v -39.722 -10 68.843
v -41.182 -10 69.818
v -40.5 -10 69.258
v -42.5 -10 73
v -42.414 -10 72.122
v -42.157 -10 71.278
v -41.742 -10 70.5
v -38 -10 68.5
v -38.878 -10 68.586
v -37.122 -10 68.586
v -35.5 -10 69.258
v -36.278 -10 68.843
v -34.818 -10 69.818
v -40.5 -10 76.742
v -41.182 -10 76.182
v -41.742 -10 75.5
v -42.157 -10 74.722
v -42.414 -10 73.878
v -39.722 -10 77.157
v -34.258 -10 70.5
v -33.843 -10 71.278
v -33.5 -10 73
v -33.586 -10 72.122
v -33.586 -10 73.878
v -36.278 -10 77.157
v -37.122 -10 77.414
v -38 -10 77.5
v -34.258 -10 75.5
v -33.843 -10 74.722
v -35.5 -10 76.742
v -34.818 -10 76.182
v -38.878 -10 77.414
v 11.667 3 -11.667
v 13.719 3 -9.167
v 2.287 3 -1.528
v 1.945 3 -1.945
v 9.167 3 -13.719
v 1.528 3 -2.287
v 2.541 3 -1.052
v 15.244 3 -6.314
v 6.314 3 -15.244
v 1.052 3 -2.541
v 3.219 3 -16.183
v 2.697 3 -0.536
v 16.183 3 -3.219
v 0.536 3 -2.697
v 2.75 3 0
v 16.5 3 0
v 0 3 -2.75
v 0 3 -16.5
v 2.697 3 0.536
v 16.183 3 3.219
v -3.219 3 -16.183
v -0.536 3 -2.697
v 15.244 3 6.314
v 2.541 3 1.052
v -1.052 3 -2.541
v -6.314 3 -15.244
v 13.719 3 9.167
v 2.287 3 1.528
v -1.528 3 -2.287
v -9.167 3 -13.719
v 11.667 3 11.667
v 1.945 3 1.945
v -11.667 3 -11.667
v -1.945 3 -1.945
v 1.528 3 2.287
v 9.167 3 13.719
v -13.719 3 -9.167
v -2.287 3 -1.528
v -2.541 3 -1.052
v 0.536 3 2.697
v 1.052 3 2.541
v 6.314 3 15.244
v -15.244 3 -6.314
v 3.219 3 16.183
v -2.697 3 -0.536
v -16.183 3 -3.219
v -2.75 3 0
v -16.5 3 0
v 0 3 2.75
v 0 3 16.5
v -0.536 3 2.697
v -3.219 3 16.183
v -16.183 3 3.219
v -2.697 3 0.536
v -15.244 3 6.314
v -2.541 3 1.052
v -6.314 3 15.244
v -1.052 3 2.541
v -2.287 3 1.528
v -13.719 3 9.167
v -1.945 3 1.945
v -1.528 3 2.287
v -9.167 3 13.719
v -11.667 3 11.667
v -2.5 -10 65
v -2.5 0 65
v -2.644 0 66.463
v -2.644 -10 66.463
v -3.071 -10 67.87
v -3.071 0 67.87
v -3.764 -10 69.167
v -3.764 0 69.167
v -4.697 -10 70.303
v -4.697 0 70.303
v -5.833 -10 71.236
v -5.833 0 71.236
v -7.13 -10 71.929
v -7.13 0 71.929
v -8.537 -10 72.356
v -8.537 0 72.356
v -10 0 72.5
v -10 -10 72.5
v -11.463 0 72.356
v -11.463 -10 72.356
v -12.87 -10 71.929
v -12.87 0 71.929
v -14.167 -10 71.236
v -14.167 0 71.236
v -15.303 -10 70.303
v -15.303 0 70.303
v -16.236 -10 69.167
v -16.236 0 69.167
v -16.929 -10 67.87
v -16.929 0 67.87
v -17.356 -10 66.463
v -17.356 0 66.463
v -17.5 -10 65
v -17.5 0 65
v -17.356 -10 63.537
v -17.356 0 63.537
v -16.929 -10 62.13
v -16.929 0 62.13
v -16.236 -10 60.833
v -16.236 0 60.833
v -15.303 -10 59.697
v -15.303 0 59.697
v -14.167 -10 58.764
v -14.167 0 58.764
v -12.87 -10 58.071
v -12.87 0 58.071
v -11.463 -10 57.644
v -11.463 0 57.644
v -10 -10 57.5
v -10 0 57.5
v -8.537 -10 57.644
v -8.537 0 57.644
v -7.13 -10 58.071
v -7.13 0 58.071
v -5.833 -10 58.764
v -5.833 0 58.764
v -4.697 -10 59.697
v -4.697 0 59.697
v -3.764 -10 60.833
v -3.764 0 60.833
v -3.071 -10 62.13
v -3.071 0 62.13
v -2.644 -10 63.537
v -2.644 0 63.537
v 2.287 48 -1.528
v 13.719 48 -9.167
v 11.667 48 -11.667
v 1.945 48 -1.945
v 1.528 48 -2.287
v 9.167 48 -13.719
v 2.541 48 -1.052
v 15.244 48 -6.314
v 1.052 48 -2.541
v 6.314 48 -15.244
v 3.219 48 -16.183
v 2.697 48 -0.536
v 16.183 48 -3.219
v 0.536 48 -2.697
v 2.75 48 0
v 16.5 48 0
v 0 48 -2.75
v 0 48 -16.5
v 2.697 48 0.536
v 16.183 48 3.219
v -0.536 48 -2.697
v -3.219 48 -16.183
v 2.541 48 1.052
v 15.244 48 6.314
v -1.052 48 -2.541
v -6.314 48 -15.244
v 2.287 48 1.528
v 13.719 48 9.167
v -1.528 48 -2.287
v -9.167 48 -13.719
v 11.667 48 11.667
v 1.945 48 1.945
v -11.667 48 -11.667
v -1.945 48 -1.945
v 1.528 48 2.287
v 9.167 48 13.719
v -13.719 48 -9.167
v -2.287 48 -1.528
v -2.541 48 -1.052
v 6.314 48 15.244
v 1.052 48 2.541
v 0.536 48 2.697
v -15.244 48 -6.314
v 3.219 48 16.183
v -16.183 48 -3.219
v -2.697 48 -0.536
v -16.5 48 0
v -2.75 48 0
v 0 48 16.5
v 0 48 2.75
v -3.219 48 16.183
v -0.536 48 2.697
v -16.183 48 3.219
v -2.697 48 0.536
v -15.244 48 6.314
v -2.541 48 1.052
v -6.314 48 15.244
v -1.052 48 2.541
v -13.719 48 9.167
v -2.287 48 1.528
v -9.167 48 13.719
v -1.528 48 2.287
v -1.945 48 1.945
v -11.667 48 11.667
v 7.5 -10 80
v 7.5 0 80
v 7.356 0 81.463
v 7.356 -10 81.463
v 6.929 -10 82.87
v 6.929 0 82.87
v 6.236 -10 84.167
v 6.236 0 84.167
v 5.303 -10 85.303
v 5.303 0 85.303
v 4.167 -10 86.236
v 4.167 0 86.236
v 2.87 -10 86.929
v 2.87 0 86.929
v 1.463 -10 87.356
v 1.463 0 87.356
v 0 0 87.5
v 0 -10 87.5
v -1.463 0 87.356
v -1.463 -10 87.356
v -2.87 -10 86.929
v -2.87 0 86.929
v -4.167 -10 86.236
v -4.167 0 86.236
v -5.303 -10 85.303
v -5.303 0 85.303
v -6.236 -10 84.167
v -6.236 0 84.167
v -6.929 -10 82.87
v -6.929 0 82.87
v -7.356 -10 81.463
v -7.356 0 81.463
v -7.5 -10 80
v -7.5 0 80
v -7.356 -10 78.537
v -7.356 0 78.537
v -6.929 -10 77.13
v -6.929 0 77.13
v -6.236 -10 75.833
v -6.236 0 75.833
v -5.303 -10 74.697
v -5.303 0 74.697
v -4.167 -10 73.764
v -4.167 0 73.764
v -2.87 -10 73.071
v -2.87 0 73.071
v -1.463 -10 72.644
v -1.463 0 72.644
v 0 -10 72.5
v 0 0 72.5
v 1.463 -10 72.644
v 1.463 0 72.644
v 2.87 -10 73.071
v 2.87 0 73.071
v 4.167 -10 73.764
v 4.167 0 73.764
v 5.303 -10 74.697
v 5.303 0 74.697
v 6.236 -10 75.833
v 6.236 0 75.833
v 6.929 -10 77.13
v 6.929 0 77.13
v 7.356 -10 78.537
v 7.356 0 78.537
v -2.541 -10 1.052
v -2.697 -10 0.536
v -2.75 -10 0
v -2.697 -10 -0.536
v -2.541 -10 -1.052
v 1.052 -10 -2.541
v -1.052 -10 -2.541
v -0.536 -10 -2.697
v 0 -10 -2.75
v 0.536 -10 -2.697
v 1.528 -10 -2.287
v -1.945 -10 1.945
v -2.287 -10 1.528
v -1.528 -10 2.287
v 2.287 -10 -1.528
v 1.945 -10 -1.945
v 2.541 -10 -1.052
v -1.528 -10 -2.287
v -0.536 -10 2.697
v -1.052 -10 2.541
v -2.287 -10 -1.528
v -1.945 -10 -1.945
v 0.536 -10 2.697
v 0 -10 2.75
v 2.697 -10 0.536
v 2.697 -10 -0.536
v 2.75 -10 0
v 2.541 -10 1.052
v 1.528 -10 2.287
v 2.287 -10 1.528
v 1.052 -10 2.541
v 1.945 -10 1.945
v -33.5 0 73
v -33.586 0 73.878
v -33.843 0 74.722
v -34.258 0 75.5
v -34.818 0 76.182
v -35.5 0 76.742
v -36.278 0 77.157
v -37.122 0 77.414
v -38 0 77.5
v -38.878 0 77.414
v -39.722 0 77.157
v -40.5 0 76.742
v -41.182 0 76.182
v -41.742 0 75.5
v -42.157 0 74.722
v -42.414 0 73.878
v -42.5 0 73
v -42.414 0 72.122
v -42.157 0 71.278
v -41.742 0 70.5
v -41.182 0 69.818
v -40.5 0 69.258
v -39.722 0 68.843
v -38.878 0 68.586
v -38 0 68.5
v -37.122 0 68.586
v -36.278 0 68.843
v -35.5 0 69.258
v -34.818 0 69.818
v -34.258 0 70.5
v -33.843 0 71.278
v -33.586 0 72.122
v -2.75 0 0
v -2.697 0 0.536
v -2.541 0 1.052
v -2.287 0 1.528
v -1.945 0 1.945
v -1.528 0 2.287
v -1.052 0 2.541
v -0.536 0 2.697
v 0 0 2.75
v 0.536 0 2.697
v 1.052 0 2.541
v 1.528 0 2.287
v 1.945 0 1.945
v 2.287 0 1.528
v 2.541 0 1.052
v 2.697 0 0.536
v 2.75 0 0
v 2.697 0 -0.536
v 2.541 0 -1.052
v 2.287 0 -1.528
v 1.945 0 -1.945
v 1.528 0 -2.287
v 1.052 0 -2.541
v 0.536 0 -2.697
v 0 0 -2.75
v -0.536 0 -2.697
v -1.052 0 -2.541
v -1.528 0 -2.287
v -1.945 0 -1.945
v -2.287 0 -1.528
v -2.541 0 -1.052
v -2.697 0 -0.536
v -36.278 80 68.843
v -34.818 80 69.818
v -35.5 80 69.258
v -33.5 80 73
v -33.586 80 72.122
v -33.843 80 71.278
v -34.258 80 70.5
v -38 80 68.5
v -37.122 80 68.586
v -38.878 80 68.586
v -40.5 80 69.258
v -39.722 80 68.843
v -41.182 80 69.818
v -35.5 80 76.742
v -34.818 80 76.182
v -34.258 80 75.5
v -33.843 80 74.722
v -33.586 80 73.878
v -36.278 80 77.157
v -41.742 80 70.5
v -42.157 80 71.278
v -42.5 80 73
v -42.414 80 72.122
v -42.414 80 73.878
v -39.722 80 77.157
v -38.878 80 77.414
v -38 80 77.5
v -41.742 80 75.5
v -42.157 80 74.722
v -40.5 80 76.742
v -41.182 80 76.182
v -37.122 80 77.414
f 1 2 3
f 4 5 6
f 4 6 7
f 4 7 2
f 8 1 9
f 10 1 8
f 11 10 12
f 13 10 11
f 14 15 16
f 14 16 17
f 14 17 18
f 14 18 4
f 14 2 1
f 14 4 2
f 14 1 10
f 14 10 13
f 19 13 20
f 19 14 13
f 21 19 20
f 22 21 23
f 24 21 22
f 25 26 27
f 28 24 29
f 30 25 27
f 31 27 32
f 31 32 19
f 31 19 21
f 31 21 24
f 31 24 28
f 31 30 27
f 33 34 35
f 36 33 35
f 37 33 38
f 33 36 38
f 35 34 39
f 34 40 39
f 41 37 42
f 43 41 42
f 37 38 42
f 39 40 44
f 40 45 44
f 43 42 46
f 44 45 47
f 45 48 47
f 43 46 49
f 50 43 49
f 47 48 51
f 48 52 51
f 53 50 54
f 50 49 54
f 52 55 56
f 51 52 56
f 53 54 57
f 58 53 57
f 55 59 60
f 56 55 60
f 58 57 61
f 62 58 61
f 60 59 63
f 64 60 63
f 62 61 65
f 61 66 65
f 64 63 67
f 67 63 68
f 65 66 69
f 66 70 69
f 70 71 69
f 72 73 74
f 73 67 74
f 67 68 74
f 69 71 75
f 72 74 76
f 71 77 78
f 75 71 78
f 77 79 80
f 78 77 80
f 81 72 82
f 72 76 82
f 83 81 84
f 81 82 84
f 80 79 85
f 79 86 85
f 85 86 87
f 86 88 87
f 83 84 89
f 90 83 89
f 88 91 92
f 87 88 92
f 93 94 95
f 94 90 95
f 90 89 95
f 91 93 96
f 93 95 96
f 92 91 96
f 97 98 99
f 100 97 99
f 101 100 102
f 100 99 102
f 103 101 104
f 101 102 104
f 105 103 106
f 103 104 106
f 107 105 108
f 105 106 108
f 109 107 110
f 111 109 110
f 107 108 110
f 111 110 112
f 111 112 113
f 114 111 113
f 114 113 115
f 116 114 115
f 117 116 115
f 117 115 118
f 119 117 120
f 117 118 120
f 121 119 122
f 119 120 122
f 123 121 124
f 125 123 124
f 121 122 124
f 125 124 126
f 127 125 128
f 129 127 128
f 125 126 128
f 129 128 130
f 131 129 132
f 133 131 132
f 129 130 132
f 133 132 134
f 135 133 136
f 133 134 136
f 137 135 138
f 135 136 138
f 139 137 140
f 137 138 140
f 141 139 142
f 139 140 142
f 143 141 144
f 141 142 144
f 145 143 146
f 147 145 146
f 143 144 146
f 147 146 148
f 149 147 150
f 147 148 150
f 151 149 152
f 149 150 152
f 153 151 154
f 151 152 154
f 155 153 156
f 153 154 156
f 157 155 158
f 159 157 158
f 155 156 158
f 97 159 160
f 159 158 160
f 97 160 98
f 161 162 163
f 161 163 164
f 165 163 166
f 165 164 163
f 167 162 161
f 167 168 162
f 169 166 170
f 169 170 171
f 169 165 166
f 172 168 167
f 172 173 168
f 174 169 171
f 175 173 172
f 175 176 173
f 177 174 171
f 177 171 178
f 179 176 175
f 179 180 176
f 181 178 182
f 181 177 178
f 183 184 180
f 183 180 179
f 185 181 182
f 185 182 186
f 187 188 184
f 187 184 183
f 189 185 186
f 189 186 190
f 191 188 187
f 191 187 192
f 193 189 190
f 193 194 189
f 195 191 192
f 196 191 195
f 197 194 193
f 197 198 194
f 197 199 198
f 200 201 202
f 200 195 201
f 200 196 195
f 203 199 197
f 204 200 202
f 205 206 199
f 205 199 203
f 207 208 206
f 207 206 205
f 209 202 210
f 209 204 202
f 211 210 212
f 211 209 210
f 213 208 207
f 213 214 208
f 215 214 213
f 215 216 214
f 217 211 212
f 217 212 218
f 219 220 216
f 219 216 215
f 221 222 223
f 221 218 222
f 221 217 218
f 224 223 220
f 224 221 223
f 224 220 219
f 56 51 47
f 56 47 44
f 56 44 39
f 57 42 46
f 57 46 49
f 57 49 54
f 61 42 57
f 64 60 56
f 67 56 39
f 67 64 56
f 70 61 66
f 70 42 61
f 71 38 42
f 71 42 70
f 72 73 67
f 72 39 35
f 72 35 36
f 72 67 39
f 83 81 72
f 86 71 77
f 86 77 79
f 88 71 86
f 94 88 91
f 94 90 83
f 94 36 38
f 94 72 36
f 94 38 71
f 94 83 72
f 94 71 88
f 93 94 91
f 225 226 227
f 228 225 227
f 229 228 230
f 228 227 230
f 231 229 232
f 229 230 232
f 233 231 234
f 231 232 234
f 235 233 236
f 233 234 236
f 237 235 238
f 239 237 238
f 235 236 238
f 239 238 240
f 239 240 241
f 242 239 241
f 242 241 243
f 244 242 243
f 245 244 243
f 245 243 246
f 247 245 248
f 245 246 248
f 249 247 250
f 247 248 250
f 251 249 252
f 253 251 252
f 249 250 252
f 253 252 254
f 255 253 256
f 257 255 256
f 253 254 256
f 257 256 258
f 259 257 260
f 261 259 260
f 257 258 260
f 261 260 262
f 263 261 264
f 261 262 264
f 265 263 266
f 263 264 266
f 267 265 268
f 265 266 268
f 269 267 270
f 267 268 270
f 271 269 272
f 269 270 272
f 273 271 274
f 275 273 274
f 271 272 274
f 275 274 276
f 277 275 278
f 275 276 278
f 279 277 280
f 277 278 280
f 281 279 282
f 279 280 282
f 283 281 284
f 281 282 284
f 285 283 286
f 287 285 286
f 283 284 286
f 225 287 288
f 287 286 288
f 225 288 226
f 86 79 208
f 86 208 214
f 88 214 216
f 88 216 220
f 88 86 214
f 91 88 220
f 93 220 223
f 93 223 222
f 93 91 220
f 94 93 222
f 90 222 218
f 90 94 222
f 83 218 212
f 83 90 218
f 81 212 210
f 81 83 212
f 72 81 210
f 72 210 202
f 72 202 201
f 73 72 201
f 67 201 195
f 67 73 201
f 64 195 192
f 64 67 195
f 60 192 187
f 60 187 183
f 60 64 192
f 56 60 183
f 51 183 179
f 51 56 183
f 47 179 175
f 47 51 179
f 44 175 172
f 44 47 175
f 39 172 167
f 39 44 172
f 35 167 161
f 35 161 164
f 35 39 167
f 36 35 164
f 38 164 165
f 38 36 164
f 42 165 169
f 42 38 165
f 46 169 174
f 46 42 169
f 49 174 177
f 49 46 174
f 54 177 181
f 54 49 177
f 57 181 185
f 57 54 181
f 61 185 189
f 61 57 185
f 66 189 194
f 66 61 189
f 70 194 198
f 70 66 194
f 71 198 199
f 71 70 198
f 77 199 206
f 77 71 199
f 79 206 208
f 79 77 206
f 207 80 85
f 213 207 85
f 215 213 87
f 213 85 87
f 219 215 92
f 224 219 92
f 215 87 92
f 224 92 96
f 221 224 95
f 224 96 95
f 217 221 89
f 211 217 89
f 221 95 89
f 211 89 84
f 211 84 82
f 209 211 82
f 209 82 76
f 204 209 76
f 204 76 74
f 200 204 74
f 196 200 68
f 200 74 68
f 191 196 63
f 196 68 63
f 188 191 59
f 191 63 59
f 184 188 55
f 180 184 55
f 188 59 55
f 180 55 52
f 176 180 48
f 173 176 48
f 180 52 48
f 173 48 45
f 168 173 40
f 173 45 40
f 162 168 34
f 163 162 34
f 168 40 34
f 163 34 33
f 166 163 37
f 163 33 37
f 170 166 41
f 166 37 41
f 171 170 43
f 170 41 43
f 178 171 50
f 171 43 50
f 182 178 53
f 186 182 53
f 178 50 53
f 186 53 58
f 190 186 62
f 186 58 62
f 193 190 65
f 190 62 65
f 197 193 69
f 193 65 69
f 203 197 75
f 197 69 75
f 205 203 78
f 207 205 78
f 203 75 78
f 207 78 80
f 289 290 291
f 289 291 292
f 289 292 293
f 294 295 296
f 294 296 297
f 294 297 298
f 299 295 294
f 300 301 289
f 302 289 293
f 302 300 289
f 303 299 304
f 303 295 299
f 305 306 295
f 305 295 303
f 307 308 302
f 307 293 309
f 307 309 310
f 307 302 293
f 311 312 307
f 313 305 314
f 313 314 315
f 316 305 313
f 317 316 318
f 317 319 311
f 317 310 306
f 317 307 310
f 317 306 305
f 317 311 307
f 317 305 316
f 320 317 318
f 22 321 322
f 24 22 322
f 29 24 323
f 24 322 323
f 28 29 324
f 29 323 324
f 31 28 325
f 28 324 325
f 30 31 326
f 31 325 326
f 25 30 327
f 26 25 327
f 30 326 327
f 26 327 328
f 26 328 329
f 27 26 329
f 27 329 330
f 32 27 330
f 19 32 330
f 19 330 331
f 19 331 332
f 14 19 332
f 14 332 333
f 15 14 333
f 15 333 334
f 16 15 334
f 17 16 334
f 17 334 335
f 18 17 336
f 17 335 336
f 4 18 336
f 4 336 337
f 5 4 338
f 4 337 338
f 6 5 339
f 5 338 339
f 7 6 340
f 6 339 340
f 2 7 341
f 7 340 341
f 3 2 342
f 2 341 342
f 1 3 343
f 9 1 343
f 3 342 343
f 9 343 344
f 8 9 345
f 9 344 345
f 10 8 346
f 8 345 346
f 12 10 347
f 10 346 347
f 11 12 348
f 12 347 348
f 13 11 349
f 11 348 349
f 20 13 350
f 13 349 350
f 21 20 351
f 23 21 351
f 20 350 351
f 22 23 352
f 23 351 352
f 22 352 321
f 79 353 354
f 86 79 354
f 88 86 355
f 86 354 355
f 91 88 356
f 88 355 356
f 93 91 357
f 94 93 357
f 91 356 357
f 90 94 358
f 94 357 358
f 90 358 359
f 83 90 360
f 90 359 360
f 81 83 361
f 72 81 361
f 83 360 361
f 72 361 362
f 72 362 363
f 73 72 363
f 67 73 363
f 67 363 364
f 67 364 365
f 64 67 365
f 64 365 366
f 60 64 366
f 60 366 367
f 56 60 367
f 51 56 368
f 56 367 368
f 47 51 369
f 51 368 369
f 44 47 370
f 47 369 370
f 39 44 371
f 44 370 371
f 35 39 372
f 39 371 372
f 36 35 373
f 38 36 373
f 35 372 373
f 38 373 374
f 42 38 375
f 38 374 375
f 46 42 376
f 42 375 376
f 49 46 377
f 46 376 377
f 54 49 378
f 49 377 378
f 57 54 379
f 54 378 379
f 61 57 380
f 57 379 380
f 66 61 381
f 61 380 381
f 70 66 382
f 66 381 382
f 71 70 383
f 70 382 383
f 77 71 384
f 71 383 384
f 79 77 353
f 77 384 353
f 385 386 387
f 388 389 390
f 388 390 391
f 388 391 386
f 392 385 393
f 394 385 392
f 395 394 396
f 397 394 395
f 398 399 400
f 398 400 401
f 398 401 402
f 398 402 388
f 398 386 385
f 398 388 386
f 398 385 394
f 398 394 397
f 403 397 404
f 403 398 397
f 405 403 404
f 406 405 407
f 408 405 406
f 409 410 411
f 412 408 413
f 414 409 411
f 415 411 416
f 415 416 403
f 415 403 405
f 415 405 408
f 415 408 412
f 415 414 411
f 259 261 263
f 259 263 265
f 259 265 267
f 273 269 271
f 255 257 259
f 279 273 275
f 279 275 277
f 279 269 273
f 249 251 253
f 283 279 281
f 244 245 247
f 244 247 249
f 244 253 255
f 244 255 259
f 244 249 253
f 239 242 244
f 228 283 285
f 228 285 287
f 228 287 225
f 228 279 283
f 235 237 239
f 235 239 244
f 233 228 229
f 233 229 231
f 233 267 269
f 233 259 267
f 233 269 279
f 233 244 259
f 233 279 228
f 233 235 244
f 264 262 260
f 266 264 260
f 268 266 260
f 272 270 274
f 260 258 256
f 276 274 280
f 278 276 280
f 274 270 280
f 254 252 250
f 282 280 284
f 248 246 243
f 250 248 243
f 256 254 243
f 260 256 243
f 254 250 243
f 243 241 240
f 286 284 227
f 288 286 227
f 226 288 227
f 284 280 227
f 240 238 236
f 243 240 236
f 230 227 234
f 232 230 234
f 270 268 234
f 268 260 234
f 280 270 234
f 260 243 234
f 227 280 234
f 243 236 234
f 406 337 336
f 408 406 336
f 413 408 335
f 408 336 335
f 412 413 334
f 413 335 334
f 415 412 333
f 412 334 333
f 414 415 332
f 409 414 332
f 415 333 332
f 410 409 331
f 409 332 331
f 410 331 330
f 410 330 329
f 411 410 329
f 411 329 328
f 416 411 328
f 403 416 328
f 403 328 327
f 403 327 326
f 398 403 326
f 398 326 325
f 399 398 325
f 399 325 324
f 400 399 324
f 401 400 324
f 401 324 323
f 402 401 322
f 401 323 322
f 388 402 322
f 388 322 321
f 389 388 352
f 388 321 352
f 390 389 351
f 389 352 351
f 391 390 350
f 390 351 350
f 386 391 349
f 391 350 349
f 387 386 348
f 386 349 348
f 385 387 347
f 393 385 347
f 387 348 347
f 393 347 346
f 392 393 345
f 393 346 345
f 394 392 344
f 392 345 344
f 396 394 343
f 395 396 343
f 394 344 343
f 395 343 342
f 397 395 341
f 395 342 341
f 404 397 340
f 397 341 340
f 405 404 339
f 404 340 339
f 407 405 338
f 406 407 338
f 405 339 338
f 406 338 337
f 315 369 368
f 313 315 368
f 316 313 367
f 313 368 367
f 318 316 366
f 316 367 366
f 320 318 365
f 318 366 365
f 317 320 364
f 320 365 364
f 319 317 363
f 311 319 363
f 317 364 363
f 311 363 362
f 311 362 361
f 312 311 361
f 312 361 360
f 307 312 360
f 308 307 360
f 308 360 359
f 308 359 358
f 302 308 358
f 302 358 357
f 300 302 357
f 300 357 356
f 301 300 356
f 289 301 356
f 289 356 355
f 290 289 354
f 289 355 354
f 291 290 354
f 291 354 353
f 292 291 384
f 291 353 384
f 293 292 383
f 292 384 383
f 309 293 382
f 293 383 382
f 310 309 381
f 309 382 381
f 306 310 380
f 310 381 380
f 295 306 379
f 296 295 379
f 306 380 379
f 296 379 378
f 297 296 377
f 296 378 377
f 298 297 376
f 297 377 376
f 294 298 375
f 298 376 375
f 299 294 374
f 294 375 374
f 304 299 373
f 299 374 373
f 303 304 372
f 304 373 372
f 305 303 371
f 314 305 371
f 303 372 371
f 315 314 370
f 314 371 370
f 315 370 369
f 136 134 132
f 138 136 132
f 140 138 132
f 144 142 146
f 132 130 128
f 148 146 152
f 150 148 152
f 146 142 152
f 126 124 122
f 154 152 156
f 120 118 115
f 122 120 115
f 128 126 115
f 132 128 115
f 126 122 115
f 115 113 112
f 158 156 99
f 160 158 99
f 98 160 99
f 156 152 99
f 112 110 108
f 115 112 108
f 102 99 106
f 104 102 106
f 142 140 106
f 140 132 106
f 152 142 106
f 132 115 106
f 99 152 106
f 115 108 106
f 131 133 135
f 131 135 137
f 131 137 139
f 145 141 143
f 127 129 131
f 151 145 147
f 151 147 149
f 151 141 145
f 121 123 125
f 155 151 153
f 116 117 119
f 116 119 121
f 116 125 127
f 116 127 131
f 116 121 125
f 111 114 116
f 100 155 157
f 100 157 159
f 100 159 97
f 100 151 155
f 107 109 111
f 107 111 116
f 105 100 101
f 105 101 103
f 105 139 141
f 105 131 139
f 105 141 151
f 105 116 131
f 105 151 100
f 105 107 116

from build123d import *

# Parameters (mm, degrees)
F0_R     = 7.5
F1_DEPTH = 10
F0_R_2   = 4.5
F0_R_3   = 2.75
F3_R     = 4.5
F4_DEPTH = 80
F5_R     = 2.75
F6_DEPTH = 3
F7_R     = 16.5
F7_R_2   = 2.75
F8_DEPTH = 45


# Not quite as in the source:
# - the program builds the solid bodies; features that only make, move or delete a surface that nothing else refers to are left out


with BuildPart() as f1:
    # F0 (on Front) → F1 (new body)
    with BuildSketch(Plane.XZ):
        with Locations((0, 80)):
            Circle(F0_R)
    extrude(amount=F1_DEPTH)


with BuildPart() as f1b:
    # F0 (on Front) → F1, piece 2 (new body)
    with BuildSketch(Plane.XZ):
        with Locations((-38, 73)):
            Circle(F0_R_2)
    extrude(amount=F1_DEPTH)

    # F3 (on face) → F4 (join)
    with BuildSketch(Plane(origin=(0, 0, 0), x_dir=(-1, 0, 0), z_dir=(0, 1, 0))):
        with Locations((38, 73)):
            Circle(F3_R)
    extrude(amount=F4_DEPTH)


with BuildPart() as f1c:
    # F0 (on Front) → F1, piece 3 (new body)
    with BuildSketch(Plane.XZ):
        with Locations((-10, 65)):
            Circle(F0_R)
    extrude(amount=F1_DEPTH)


with BuildPart() as f1d:
    # F0 (on Front) → F1, piece 4 (new body)
    with BuildSketch(Plane.XZ):
        Circle(F0_R_3)
    extrude(amount=F1_DEPTH)

    # F5 (on face) → F6 (join)
    with BuildSketch(Plane(origin=(0, 0, 0), x_dir=(-1, 0, 0), z_dir=(0, 1, 0))):
        Circle(F5_R)
    extrude(amount=F6_DEPTH)


with BuildPart() as f8:
    # F7 (on face) → F8 (new body)
    with BuildSketch(Plane(origin=(0, 3, 0), x_dir=(-1, 0, 0), z_dir=(0, 1, 0))):
        Circle(F7_R)
        Circle(F7_R_2, mode=Mode.SUBTRACT)
    extrude(amount=F8_DEPTH)


solid = Compound([f1.part, f1b.part, f1c.part, f1d.part, f8.part])
